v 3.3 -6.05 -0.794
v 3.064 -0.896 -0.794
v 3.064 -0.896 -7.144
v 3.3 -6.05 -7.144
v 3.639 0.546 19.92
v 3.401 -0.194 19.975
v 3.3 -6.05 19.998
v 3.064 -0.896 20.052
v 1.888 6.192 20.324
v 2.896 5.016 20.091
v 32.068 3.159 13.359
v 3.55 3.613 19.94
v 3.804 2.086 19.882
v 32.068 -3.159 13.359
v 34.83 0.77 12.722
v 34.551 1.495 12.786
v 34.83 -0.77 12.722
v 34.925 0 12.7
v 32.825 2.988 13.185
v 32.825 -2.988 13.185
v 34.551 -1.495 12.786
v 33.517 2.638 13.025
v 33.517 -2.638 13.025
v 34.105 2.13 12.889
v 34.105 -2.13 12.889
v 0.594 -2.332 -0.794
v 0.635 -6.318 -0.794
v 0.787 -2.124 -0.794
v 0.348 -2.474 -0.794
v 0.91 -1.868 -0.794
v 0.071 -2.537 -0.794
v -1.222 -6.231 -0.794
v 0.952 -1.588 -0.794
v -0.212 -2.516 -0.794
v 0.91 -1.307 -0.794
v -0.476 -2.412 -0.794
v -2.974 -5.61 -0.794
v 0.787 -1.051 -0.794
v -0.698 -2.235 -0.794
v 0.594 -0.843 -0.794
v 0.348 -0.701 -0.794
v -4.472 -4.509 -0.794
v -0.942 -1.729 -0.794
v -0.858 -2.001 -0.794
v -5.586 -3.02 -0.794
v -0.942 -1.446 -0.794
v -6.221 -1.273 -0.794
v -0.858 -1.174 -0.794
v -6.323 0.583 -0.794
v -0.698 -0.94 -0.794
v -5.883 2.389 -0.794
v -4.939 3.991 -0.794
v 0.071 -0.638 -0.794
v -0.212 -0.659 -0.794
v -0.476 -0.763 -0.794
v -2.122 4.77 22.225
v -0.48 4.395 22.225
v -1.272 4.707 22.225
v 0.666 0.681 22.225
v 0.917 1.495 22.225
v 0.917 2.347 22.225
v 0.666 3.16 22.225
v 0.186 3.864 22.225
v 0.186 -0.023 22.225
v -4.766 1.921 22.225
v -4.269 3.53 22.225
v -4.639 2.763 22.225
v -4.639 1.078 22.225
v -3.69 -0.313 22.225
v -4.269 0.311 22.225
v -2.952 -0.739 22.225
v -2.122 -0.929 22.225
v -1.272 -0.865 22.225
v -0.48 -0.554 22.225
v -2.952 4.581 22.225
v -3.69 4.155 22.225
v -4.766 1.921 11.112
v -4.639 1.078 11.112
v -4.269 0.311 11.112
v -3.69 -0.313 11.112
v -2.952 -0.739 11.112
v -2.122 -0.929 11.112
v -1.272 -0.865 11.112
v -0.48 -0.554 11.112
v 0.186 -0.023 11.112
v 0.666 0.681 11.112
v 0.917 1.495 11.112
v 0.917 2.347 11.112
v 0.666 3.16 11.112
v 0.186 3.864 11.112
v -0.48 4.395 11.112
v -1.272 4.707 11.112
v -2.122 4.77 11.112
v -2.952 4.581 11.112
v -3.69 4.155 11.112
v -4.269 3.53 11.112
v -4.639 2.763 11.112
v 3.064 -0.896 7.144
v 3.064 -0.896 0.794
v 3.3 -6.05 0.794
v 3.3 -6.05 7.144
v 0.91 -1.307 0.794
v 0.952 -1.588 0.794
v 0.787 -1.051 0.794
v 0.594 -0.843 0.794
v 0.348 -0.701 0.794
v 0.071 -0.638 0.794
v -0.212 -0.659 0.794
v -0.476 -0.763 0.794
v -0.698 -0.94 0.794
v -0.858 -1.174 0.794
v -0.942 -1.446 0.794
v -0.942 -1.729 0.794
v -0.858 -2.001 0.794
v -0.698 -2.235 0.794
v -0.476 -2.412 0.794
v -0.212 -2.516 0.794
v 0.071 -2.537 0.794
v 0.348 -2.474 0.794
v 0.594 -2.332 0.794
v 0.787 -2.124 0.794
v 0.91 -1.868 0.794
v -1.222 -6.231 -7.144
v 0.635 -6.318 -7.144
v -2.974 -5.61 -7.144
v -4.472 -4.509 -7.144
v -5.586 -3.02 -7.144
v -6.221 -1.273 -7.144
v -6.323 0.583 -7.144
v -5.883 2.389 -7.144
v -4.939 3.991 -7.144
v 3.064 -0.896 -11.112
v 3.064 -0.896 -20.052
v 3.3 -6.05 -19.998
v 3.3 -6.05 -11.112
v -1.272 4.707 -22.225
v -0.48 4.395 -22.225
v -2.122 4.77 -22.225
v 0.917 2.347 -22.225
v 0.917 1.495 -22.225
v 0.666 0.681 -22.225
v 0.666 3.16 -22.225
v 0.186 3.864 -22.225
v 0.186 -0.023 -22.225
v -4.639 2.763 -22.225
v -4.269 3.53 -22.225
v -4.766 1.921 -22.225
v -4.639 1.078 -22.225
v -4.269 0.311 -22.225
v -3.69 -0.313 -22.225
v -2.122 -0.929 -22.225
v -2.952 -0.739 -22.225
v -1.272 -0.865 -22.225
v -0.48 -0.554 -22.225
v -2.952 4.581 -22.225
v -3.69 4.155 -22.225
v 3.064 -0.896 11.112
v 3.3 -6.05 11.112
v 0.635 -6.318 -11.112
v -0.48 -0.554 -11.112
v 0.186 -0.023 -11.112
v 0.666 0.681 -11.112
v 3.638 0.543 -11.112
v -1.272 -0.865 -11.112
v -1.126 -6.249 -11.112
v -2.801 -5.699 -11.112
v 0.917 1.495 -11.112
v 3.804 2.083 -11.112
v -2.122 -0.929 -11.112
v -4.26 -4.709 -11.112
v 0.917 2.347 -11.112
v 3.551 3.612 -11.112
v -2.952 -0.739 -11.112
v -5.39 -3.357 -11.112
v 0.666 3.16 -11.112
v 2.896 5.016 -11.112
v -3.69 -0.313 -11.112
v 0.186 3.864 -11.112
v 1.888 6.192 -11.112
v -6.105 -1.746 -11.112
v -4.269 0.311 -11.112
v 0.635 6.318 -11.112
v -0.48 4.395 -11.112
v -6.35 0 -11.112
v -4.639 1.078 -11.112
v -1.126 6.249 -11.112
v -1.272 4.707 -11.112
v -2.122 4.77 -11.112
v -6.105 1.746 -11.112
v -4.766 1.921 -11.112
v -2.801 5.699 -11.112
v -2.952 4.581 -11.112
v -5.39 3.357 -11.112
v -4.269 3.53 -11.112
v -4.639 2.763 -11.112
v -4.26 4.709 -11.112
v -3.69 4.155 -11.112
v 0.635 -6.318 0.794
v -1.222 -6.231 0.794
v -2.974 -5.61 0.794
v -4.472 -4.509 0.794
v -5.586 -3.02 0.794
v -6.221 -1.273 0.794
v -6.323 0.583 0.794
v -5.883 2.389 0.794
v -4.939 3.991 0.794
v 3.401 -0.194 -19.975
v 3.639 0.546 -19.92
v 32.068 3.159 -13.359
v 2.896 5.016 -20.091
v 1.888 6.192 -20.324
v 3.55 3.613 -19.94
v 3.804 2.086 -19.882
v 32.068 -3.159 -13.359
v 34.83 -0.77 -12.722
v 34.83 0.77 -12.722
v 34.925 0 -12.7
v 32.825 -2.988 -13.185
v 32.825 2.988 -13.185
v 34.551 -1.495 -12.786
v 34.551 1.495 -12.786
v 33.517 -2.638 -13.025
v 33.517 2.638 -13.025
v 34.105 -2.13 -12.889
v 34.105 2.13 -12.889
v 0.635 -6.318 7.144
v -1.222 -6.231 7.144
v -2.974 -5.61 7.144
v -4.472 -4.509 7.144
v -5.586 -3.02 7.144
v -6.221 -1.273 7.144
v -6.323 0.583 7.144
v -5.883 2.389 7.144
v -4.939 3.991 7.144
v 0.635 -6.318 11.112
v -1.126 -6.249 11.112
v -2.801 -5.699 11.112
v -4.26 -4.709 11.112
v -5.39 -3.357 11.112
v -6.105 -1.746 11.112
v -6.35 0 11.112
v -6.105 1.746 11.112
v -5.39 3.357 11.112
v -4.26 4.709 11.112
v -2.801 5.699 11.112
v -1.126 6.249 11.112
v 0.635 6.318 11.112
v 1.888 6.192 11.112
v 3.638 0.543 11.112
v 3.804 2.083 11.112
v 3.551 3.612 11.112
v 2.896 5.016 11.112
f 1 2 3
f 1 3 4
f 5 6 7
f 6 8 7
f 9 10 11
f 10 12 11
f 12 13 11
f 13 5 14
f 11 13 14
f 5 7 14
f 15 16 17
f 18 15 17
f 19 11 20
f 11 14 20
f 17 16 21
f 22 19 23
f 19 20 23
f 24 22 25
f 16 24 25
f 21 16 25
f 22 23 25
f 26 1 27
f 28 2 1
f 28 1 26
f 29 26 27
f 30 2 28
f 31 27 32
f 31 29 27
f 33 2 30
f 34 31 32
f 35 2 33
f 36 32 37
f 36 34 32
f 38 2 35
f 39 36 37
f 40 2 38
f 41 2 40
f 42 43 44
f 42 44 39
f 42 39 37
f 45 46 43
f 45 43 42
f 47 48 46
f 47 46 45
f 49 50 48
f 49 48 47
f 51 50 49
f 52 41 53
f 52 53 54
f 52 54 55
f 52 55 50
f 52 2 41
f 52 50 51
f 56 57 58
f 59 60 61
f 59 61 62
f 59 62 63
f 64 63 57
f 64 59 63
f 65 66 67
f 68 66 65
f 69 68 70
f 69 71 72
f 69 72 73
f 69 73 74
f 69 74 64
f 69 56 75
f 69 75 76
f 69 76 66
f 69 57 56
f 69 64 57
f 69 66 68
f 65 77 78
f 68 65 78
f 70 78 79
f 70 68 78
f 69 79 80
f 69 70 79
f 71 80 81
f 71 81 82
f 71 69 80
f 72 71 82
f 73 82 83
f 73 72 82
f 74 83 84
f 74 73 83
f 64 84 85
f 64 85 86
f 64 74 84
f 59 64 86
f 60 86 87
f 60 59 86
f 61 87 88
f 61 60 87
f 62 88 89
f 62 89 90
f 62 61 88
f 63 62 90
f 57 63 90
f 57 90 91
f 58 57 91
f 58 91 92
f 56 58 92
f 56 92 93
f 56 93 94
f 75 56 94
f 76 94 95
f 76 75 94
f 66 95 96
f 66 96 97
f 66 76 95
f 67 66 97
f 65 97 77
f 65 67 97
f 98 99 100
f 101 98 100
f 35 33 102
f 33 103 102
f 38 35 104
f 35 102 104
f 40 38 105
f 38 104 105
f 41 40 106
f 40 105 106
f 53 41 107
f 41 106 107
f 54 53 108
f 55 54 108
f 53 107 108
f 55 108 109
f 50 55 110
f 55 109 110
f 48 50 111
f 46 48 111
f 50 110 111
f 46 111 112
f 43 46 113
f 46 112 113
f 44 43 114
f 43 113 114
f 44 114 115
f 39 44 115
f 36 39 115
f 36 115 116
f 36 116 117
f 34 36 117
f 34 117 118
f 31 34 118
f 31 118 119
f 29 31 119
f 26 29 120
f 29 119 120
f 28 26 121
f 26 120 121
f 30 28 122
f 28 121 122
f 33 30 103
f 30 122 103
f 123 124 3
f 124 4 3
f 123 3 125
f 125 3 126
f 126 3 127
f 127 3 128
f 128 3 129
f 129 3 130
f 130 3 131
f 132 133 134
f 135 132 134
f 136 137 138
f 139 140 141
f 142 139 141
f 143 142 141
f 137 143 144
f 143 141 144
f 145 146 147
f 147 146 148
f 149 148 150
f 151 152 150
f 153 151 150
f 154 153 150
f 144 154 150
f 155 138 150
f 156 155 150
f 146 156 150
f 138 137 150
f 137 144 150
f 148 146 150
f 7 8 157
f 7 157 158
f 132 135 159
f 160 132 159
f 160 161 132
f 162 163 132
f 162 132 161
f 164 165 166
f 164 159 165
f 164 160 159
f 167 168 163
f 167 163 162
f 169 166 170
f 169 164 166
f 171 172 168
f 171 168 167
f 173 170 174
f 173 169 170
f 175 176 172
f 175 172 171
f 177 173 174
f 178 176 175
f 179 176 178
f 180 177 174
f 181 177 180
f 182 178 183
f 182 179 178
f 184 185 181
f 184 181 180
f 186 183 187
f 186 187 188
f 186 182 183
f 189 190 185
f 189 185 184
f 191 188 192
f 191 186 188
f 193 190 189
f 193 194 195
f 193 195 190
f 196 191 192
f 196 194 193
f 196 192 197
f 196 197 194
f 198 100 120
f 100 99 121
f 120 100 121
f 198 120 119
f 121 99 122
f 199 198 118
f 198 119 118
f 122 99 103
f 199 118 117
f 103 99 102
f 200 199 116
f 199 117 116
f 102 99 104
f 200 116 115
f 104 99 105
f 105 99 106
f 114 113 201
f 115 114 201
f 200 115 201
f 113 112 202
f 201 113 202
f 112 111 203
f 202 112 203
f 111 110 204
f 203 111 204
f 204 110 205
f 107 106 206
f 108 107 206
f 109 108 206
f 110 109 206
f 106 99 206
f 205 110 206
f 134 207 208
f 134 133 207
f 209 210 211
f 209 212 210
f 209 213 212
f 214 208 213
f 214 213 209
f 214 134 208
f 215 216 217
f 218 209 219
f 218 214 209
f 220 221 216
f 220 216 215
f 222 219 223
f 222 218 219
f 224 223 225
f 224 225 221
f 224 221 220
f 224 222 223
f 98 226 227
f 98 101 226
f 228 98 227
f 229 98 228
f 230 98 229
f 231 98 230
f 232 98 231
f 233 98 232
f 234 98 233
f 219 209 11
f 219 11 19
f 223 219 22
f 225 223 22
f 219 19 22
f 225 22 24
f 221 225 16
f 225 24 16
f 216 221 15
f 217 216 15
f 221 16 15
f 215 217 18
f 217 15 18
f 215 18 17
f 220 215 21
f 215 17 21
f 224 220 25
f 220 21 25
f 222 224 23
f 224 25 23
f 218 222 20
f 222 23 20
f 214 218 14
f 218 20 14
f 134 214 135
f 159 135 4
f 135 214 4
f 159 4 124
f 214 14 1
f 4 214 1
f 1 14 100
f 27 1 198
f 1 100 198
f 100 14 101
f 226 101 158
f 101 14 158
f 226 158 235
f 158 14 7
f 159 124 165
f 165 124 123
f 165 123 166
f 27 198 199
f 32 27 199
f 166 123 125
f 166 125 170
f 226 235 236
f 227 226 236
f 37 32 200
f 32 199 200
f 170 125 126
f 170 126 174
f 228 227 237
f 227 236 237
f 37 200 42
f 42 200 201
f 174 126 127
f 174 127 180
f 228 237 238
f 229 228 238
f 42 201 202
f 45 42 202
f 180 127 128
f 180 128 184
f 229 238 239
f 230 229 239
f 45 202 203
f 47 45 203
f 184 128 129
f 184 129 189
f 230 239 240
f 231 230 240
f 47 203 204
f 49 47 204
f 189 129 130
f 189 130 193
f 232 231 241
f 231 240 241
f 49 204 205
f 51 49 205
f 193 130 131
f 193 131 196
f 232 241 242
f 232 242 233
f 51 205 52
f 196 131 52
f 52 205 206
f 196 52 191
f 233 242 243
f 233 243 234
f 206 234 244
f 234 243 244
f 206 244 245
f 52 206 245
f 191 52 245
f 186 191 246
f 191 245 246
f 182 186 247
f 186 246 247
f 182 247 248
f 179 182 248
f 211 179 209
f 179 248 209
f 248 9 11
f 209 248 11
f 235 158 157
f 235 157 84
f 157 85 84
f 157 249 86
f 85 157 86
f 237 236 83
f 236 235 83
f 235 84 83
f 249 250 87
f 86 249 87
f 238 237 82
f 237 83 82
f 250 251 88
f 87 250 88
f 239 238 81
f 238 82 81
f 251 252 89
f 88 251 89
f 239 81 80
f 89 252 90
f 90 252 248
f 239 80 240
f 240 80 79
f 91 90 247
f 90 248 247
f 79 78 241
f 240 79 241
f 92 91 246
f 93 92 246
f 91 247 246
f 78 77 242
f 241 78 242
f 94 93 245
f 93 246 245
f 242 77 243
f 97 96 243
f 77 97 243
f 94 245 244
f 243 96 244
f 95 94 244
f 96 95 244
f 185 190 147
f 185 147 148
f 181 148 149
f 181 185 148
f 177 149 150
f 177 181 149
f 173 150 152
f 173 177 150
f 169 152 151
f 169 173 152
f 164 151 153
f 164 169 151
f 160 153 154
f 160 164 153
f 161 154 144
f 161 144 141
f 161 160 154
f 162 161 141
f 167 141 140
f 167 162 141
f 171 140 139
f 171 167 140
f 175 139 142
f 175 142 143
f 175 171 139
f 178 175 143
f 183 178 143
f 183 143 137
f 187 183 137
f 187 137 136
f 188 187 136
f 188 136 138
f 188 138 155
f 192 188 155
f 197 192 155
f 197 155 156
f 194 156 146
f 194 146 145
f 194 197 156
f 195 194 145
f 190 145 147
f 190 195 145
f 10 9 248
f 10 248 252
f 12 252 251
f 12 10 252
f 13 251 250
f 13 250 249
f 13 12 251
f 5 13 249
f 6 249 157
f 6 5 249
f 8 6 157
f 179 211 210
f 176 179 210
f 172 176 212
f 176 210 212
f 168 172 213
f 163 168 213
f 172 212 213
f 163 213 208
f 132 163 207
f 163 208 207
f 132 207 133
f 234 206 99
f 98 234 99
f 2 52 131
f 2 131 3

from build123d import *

# Parameters (mm, degrees)
SKETCH2_R               = 2.54
BOSS_EXTRUDE1_DEPTH     = 22.225
CUT_EXTRUDE1_DEPTH      = 7.35
CUT_EXTRUDE1_DEPTH_BACK = 7.35
SKETCH7_R               = 0.9525
CUT_EXTRUDE5_DEPTH      = 0.9525
CUT_EXTRUDE6_DEPTH      = 14.2875
SKETCH11_R              = 2.8575
BOSS_EXTRUDE2_DEPTH     = 22.225
CUT_EXTRUDE7_DEPTH      = 6.35


with BuildPart() as part:
    # Sketch2 → Boss-Extrude1 (new body, symmetric)
    with BuildSketch(Plane.XY):
        with BuildLine():
            Line((0.635, 6.318170226), (32.0675, 3.159085113))
            ThreePointArc((32.0675, 3.159085113), (34.925, 0), (32.0675, -3.159085113))
            Line((32.0675, -3.159085113), (0.635, -6.318170226))
            ThreePointArc((0.635, -6.318170226), (-6.35, 0), (0.635, 6.318170226))
        make_face()
        with Locations((-1.908273726, 1.920652886)):
            Circle(SKETCH2_R, mode=Mode.SUBTRACT)
    extrude(amount=BOSS_EXTRUDE1_DEPTH, both=True)

    # Sketch3 → Cut-Extrude1 (cut, two sides)
    with BuildSketch(Plane(origin=(0, 0, 0), x_dir=(1, 0, 0), z_dir=(0, 1, 0))) as cut_extrude1_sk:
        Polygon((-6.35, 22.225), (34.925, 12.7), (34.925, 31.680918885), align=None)
        Polygon((-6.35, -22.225), (34.925, -12.7), (34.925, -37.636863469), align=None)
    extrude(amount=CUT_EXTRUDE1_DEPTH, mode=Mode.SUBTRACT)
    extrude(cut_extrude1_sk.sketch, amount=-CUT_EXTRUDE1_DEPTH_BACK, mode=Mode.SUBTRACT)

    # Sketch7 → Cut-Extrude5 (cut, symmetric)
    with BuildSketch(Plane.XY):
        with Locations((0, -1.5875)):
            Circle(SKETCH7_R)
    extrude(amount=CUT_EXTRUDE5_DEPTH, both=True, mode=Mode.SUBTRACT)

    # Sketch5 → Cut-Extrude6 (cut)
    with BuildSketch(Plane.XY.offset(25.4)):
        with BuildLine():
            Line((3.064489009, -0.895879696), (3.299937252, -6.050333954))
            Line((3.299937252, -6.050333954), (5.210798469, -13.210091767))
            Line((5.210798469, -13.210091767), (-7.623273726, -5.718328917))
            Line((-7.623273726, -5.718328917), (-7.623273726, 1.920652886))
            ThreePointArc((-7.623273726, 1.920652886), (-0.451927961, 7.446979153), (3.064489009, -0.895879696))
        make_face()
    cut_extrude6 = extrude(amount=-CUT_EXTRUDE6_DEPTH, mode=Mode.SUBTRACT)

    # Mirror2: Cut-Extrude6 across plane
    add(cut_extrude6.mirror(Plane.XY), mode=Mode.SUBTRACT)

    # Sketch11 → Boss-Extrude2 (add, symmetric)
    with BuildSketch(Plane.XY):
        with Locations(Location((-1.908273726, 1.920652886, 0), (0, 0, 180))):  # turned: the seam where the file's is
            Circle(SKETCH11_R)
    extrude(amount=BOSS_EXTRUDE2_DEPTH, both=True)

    # Sketch9 → Cut-Extrude7 (cut)
    with BuildSketch(Plane.XY.offset(0.79375)):
        Polygon((-4.939406342, 3.990584542), (3.064489009, -0.895879696), (3.299937252, -6.050333954), (-14.496579657, -7.838951202), align=None)
    cut_extrude7 = extrude(amount=CUT_EXTRUDE7_DEPTH, mode=Mode.SUBTRACT)

    # Mirror1: Cut-Extrude7 across plane
    add(cut_extrude7.mirror(Plane.XY), mode=Mode.SUBTRACT)


solid = part.part
